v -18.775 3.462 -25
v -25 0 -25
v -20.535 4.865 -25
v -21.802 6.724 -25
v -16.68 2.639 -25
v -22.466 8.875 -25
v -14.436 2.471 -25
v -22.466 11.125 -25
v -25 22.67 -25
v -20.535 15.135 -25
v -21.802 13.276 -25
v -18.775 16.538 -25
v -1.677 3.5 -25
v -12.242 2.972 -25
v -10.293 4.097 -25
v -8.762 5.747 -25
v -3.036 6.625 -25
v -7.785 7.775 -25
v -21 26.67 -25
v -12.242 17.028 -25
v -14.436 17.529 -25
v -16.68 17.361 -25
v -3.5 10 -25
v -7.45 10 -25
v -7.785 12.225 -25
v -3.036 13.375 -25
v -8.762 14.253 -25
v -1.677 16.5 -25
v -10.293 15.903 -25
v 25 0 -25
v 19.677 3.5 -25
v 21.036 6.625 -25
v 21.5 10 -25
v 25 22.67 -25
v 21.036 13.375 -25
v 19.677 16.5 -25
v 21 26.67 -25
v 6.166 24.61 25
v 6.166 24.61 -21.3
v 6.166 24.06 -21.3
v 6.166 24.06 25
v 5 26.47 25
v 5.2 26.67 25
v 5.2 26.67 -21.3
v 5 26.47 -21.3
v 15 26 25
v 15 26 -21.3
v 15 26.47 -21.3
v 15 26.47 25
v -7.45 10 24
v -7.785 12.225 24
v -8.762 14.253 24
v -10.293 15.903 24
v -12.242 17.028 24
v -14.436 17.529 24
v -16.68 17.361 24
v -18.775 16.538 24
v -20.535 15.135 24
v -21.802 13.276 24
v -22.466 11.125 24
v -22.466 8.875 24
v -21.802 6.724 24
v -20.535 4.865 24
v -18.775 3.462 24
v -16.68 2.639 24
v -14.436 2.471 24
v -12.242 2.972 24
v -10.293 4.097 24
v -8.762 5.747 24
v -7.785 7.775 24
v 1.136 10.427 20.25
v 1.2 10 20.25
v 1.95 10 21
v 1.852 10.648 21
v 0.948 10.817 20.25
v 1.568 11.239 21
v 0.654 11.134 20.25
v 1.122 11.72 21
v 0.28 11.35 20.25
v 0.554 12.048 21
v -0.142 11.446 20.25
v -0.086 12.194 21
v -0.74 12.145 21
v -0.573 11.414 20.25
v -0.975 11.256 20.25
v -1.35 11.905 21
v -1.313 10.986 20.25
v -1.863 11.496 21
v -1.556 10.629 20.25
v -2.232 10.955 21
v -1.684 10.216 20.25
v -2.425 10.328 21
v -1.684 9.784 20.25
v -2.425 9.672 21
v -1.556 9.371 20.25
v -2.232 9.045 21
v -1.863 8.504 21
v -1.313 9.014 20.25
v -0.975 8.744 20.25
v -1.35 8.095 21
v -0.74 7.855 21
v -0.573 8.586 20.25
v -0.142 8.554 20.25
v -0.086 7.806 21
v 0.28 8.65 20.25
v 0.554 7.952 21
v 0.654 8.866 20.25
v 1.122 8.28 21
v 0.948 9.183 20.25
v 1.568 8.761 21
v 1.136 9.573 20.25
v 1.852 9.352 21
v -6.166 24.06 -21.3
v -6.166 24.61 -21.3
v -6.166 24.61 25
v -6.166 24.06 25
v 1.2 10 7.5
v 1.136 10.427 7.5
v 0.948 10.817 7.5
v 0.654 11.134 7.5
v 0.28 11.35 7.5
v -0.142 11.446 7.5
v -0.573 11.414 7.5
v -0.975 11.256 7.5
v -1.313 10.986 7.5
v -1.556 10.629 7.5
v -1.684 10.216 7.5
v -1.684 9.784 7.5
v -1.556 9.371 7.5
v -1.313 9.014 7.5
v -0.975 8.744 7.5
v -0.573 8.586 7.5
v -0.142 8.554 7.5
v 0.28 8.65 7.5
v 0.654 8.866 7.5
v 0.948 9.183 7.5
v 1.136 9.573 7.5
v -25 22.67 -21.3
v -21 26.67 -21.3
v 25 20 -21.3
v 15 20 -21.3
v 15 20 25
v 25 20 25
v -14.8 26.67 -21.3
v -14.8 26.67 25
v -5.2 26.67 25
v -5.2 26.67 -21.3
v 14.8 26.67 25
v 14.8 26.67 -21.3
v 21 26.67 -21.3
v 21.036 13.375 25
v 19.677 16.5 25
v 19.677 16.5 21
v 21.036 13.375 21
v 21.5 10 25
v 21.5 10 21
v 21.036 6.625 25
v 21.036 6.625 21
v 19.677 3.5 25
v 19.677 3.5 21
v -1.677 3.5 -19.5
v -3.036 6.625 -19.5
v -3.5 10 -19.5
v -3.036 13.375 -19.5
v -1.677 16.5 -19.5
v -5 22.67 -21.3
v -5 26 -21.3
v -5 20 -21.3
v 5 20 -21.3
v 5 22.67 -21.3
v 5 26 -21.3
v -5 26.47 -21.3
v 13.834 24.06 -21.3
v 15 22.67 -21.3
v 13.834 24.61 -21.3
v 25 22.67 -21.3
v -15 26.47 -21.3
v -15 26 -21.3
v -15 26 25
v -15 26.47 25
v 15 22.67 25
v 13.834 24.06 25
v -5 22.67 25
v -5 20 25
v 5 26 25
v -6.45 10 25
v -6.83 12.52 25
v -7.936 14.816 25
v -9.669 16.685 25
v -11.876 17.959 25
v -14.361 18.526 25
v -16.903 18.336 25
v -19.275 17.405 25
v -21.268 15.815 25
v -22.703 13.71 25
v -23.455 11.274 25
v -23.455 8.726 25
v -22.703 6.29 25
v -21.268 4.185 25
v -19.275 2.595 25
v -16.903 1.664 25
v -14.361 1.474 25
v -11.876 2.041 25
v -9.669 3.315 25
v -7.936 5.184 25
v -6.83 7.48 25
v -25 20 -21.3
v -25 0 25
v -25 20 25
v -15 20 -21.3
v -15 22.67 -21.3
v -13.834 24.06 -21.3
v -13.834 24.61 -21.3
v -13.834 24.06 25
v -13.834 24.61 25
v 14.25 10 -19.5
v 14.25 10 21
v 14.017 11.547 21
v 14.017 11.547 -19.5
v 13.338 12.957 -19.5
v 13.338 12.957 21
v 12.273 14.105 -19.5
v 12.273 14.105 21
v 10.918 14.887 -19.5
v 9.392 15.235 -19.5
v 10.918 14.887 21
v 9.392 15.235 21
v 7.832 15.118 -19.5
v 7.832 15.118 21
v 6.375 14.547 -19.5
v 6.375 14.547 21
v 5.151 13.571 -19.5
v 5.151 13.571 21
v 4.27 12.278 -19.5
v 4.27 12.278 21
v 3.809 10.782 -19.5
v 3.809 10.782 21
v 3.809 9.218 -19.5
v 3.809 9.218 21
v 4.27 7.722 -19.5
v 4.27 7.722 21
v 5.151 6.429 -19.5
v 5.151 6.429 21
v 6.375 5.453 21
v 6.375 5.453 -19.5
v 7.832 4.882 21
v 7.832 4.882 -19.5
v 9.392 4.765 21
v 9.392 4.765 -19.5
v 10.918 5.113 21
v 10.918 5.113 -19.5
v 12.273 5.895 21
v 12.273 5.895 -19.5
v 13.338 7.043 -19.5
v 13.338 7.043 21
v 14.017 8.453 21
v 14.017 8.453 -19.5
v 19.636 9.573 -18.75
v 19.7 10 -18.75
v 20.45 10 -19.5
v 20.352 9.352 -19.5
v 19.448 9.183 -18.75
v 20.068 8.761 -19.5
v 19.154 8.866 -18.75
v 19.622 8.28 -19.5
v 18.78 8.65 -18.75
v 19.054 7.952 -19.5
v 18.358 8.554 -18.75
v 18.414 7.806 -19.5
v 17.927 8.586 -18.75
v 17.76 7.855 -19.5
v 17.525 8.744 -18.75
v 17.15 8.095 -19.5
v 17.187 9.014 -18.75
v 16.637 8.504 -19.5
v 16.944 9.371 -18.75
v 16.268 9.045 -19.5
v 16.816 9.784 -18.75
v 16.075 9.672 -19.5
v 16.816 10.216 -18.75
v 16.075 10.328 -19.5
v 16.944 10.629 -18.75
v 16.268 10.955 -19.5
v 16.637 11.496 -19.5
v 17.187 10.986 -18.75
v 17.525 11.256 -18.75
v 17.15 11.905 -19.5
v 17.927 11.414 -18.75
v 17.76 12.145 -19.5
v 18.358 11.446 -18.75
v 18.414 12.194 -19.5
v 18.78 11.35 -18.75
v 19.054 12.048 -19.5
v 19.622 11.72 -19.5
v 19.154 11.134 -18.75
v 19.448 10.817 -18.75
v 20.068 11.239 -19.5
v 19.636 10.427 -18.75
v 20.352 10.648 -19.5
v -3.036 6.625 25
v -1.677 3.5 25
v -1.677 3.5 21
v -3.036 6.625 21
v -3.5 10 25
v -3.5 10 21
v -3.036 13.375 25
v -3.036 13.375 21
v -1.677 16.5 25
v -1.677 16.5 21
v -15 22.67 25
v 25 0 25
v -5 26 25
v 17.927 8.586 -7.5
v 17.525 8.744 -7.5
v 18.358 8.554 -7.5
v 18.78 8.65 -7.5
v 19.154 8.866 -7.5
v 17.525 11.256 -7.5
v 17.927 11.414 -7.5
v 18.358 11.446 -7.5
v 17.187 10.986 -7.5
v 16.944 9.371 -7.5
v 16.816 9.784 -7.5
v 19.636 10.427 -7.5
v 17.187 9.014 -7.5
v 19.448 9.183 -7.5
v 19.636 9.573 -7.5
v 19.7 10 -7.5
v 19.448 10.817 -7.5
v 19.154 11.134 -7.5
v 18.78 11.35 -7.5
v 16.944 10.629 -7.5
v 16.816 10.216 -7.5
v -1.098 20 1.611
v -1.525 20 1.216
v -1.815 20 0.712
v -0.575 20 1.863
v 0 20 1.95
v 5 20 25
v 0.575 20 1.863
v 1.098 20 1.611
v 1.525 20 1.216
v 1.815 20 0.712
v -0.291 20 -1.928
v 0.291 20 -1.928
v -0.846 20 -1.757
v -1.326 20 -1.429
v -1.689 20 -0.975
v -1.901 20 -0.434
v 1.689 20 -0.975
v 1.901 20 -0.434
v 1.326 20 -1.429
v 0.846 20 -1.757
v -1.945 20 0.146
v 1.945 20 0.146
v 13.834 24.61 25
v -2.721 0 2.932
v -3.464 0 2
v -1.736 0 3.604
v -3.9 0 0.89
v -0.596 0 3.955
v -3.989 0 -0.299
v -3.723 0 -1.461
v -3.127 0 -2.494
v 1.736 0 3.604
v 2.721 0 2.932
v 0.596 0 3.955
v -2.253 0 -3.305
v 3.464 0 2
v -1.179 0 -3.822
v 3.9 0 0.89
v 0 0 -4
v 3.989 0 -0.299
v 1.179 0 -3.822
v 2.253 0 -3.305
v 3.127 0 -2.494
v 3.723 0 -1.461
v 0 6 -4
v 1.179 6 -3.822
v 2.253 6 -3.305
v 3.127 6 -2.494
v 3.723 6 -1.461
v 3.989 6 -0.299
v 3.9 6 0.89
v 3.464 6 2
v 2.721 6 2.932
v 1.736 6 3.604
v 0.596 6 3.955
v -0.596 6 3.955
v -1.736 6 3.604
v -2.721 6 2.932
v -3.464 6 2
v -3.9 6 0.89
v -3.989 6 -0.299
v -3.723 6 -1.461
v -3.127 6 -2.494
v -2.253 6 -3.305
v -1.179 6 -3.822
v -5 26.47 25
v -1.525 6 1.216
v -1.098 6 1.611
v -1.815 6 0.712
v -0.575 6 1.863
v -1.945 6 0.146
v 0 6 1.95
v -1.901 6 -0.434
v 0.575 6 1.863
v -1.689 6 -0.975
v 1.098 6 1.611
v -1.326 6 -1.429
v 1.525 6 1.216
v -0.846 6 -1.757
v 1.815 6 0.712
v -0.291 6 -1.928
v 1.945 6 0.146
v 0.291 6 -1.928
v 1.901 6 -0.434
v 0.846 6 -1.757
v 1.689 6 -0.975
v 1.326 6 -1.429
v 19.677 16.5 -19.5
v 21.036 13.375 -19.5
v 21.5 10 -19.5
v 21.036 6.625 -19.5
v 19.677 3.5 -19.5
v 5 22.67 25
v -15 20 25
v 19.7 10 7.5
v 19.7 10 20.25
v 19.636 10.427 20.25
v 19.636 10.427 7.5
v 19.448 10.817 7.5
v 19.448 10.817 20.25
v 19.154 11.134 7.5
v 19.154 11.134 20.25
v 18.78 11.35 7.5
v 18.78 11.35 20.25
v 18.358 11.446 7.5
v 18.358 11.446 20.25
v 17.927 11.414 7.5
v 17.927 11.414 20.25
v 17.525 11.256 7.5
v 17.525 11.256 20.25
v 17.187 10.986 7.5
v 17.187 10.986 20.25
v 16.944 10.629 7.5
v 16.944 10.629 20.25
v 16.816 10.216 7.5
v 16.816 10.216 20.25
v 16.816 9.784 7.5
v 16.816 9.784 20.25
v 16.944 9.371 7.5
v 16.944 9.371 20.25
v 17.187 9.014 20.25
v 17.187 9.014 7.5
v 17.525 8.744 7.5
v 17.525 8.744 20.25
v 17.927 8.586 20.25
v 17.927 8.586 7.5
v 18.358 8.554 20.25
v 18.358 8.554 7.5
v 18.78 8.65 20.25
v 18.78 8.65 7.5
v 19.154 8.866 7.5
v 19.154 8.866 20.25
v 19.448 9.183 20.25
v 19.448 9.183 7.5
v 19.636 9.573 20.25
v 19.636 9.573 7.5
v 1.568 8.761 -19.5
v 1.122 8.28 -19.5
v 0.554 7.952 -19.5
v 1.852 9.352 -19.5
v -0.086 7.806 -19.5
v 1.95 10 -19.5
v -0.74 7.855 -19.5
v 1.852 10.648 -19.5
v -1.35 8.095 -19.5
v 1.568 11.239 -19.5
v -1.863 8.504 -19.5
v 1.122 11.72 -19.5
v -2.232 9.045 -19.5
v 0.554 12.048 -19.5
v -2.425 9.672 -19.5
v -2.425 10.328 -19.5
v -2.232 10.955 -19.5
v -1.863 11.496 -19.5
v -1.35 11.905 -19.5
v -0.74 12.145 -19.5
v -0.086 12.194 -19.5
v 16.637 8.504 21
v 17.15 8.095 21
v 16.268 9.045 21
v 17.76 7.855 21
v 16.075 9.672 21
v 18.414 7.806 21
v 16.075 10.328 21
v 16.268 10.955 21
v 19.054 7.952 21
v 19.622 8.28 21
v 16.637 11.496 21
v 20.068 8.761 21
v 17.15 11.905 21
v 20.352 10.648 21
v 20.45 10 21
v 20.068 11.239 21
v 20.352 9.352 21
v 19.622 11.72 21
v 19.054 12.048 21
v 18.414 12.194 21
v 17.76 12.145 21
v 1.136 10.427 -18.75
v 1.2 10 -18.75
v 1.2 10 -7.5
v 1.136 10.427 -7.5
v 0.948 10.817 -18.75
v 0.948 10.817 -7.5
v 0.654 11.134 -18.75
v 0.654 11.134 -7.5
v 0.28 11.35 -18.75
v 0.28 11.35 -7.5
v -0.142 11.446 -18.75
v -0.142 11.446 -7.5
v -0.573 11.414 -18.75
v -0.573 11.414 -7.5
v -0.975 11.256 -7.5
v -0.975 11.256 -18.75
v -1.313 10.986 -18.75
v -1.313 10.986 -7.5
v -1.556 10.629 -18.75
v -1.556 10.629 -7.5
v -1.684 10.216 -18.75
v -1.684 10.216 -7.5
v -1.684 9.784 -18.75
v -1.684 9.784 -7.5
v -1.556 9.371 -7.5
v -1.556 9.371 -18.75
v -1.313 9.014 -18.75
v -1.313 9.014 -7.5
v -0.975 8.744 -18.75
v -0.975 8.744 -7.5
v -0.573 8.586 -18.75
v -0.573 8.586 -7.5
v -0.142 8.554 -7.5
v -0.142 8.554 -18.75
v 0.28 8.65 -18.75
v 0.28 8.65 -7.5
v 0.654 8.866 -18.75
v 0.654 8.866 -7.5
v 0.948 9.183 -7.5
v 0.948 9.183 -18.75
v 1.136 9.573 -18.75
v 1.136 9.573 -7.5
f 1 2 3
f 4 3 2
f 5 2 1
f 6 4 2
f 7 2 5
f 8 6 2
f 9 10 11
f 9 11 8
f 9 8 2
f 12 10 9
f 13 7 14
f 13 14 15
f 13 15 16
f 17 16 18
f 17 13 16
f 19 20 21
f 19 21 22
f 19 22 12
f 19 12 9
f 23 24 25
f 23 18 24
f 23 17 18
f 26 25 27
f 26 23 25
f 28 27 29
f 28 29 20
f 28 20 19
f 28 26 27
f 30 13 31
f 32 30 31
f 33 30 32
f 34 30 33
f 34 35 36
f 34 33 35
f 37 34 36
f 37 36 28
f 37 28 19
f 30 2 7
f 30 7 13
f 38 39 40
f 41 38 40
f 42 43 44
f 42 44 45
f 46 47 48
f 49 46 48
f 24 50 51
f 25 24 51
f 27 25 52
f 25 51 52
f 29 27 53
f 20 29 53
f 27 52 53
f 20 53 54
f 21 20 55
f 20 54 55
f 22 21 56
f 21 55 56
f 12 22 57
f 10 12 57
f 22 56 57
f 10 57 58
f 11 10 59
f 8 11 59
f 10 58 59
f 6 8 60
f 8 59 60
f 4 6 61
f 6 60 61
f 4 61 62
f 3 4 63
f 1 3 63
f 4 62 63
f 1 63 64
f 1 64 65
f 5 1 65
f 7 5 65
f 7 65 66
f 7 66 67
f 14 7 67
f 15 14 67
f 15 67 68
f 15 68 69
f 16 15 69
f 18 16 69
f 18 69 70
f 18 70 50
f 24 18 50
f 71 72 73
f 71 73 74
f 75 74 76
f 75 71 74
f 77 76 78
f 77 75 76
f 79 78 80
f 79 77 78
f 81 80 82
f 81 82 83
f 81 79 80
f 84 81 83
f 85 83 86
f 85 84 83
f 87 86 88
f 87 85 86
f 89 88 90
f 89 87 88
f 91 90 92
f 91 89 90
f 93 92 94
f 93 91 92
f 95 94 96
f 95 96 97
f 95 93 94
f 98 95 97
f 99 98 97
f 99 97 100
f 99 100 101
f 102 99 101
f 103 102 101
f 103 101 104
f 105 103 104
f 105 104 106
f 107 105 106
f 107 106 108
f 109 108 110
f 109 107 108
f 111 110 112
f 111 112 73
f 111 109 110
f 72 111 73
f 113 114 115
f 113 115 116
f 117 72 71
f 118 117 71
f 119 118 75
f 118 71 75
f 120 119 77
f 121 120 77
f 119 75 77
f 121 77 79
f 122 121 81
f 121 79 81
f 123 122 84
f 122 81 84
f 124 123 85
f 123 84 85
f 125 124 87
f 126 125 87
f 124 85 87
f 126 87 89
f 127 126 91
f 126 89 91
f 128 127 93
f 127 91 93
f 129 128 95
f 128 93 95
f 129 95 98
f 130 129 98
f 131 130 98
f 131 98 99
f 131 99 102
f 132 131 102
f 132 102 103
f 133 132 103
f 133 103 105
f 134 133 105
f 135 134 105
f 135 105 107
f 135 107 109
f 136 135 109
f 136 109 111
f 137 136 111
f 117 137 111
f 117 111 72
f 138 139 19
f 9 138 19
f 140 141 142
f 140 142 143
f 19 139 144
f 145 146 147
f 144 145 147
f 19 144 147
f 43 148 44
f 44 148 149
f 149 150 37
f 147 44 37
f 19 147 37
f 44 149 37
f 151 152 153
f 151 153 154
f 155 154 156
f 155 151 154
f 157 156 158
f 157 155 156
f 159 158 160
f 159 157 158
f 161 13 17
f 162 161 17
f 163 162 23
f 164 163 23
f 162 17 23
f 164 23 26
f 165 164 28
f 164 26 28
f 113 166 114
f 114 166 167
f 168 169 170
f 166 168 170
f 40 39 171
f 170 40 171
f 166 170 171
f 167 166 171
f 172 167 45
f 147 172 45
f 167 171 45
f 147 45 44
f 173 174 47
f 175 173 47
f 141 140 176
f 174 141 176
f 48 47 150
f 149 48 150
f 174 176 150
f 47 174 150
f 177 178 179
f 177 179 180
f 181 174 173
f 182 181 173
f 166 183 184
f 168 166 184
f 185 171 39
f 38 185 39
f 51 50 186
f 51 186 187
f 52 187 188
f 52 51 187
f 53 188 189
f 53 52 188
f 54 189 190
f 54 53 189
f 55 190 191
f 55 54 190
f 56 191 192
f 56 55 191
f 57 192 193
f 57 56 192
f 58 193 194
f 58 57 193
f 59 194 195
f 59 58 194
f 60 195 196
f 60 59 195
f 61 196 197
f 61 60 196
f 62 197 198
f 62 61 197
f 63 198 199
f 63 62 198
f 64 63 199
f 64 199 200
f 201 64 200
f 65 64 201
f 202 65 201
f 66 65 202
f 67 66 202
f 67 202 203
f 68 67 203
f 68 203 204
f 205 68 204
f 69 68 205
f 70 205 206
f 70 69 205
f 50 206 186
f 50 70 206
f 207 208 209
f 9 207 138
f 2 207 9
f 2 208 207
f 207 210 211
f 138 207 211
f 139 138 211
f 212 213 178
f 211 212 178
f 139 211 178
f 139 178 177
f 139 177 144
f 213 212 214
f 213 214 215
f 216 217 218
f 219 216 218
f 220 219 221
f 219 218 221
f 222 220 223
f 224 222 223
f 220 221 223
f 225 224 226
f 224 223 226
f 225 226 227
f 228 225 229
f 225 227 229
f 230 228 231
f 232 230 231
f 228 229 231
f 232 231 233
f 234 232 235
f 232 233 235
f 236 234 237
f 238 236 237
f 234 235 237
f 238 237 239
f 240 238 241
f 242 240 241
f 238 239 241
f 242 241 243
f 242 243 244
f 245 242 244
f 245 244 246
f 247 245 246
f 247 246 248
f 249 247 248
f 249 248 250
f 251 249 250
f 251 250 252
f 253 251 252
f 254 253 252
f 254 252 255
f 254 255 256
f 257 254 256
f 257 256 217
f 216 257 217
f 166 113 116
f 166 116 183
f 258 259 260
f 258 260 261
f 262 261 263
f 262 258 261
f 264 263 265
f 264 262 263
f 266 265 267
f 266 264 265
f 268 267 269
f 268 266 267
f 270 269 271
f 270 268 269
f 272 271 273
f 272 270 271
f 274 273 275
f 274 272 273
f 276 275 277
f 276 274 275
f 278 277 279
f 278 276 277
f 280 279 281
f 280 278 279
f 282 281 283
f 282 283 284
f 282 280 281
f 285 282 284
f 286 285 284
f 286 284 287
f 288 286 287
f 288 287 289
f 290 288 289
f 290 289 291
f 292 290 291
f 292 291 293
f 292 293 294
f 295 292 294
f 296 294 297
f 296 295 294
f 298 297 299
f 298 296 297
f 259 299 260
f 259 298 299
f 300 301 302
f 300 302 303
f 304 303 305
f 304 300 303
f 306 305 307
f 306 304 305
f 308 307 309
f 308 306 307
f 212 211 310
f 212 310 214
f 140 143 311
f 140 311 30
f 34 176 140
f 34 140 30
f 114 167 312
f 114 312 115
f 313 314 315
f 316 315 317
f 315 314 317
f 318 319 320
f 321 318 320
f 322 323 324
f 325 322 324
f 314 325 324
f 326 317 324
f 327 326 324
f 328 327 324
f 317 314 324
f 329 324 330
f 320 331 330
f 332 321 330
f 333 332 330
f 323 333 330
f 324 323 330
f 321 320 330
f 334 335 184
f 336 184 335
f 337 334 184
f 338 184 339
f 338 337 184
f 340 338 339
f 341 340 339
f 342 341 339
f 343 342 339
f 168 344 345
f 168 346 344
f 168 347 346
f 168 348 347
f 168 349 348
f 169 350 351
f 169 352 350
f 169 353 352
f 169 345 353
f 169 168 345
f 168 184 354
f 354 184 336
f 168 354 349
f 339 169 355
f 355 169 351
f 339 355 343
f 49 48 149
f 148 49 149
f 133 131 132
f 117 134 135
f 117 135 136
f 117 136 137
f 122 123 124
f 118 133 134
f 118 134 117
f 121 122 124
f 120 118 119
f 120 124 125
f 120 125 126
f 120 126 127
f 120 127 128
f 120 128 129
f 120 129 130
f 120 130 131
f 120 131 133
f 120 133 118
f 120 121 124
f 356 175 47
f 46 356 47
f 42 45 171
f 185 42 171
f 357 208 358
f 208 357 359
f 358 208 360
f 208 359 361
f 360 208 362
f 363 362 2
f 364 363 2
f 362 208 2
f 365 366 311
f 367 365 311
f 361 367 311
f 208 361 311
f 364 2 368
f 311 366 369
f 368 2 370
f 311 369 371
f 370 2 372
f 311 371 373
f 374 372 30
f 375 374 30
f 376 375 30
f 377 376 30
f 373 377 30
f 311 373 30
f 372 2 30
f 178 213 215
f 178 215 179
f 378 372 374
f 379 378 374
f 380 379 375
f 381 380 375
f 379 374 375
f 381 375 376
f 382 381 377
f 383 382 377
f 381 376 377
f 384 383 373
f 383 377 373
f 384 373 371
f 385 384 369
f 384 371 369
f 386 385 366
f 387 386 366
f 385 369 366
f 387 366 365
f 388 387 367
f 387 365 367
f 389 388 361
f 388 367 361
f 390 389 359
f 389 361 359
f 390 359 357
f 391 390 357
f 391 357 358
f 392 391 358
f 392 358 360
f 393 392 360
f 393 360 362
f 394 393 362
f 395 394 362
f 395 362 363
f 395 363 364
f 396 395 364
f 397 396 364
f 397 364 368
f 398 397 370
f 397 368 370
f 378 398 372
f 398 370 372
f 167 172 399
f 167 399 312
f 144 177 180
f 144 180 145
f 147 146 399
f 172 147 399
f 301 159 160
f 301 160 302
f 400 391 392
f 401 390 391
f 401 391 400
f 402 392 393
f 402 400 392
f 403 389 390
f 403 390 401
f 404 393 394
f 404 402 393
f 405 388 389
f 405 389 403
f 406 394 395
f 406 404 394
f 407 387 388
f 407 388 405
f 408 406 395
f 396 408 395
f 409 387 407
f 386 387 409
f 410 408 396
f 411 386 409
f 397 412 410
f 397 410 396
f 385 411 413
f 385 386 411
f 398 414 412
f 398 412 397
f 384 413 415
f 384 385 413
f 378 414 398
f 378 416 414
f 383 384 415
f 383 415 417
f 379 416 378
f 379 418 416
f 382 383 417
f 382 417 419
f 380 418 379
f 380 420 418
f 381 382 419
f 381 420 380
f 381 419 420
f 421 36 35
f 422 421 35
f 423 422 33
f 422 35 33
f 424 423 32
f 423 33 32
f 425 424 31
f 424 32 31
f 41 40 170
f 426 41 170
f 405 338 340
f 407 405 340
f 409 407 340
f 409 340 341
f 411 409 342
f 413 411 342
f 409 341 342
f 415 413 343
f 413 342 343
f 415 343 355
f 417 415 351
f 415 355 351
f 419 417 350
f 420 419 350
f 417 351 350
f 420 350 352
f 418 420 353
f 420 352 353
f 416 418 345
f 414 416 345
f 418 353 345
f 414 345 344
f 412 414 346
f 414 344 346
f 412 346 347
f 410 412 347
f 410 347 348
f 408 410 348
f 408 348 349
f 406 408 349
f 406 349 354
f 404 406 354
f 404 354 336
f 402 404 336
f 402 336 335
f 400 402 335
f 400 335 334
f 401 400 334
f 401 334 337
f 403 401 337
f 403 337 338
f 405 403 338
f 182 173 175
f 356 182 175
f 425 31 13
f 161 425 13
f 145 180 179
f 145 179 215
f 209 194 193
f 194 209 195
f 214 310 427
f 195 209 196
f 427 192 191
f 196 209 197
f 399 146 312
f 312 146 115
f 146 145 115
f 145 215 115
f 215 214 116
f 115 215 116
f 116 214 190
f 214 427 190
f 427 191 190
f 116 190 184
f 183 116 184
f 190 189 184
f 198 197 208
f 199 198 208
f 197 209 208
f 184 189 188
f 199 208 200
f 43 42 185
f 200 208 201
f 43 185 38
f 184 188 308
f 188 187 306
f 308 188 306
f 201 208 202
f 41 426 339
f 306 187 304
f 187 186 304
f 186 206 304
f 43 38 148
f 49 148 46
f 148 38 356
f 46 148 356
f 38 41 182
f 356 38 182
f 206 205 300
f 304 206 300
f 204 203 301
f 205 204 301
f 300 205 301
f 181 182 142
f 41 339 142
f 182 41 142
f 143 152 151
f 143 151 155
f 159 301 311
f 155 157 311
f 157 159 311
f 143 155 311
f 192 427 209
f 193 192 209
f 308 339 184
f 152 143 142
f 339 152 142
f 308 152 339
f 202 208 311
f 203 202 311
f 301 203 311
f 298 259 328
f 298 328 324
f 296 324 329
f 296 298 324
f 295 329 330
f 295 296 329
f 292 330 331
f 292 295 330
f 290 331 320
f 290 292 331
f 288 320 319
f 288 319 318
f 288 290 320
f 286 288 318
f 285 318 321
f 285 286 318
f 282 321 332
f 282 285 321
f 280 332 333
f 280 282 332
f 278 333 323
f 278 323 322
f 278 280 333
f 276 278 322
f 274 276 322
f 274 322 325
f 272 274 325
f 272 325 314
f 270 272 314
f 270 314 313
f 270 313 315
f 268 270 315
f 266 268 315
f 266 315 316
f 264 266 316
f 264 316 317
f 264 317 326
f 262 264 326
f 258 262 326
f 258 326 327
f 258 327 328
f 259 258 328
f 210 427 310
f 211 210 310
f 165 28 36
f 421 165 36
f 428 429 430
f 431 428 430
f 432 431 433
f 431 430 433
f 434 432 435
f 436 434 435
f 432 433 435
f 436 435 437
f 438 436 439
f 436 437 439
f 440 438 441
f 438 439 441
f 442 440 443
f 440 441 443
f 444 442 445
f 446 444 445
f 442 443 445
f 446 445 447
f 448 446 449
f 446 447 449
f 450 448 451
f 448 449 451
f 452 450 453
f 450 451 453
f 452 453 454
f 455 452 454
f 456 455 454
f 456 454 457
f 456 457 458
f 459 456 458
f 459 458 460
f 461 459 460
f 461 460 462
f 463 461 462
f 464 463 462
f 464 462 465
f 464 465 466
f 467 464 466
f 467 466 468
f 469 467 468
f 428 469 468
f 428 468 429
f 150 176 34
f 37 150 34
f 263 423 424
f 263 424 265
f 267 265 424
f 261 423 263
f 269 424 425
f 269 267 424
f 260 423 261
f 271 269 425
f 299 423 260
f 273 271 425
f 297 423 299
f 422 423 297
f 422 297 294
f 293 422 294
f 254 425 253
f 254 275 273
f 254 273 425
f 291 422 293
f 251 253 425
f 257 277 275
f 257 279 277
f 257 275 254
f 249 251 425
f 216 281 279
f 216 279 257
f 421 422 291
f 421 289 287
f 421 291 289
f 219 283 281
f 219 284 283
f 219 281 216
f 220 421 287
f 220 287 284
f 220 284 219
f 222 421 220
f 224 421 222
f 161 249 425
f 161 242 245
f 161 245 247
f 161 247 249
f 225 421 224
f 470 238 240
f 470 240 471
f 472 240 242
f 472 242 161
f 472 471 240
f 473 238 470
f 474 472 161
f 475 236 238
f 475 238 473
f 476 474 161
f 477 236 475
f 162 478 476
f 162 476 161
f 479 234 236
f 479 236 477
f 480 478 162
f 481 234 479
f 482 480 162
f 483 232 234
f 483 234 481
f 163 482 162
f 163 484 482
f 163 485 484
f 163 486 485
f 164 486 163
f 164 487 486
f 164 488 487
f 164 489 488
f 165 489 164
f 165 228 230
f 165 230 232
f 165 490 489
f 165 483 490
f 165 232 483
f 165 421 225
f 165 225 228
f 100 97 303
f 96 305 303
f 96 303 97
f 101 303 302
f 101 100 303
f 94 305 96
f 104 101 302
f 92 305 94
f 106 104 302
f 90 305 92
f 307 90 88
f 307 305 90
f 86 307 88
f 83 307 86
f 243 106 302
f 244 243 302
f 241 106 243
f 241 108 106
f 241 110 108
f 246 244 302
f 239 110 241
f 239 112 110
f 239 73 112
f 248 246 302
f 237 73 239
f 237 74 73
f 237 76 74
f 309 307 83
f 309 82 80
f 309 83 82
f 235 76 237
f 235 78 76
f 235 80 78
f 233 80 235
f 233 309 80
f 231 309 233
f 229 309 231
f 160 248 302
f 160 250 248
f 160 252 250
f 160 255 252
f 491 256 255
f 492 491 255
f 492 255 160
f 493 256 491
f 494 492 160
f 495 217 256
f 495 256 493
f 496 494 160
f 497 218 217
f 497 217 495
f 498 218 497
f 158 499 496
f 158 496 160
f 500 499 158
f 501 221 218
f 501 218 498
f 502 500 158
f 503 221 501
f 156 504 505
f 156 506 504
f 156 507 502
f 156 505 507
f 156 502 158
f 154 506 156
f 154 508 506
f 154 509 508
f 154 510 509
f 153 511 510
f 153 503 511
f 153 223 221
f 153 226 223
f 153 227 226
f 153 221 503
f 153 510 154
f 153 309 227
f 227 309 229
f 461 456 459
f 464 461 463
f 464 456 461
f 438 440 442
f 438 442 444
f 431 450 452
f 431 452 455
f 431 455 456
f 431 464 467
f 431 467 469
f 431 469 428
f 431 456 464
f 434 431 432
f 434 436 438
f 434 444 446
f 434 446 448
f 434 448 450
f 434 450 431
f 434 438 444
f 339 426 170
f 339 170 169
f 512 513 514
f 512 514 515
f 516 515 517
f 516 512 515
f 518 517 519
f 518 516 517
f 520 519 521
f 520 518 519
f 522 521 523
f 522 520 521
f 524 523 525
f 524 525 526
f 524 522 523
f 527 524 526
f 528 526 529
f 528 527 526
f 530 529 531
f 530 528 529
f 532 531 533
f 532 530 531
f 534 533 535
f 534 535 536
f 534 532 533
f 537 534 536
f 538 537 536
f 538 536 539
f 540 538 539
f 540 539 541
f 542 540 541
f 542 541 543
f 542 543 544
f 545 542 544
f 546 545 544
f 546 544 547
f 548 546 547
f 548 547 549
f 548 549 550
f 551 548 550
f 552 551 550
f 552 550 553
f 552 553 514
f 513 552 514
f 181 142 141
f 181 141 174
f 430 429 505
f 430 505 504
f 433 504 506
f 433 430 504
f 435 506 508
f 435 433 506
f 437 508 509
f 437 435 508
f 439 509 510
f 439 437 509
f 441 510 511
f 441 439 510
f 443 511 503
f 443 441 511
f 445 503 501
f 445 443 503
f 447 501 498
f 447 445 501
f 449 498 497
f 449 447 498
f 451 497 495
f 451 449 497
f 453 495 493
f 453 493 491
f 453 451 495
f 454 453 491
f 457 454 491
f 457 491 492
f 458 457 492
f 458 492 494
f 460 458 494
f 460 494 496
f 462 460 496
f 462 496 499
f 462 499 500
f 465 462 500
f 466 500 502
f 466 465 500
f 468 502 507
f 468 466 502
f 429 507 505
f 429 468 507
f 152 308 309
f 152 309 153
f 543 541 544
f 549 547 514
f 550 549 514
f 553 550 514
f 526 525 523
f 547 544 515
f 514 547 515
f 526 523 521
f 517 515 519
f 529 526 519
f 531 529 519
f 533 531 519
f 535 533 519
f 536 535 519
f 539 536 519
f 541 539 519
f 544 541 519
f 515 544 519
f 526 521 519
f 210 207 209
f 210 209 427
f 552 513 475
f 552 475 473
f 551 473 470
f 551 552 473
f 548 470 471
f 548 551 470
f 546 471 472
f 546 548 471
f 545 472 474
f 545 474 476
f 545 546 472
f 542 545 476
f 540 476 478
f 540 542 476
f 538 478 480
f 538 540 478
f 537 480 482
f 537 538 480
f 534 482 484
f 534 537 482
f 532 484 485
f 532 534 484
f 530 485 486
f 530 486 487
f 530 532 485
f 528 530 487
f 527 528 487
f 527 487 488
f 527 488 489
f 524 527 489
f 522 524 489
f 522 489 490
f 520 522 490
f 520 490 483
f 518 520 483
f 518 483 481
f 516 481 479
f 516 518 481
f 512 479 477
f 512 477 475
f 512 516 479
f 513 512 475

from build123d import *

# Parameters (mm, degrees)
SKICA4_W                  = 50
SKICA4_H                  = 50
P_IDAT_VYSUNUT_M2_DEPTH   = 20
ODEBRAT_VYSUNUT_M3_DEPTH  = 3.5
SKICA6_R                  = 1.45
ODEBRAT_VYSUNUT_M4_DEPTH  = 14
SKICA7_R                  = 5.25
ODEBRAT_VYSUNUT_M5_DEPTH  = 57.455734873
SKICA8_R                  = 7.55
ODEBRAT_VYSUNUT_M6_DEPTH  = 60.371710435
P_IDAT_VYSUNUT_M4_DEPTH   = 50
SKICA12_R                 = 1.95
ODEBRAT_VYSUNUT_M7_DEPTH  = 41.620192023
SKICA13_R                 = 4
ODEBRAT_VYSUNUT_M8_DEPTH  = 6
P_IDAT_VYSUNUT_M5_REACH   = 63.938
SKICA14_W                 = 3.7
SKICA14_H                 = 6.67
ZKOSEN_1_SIZE             = 1
ODEBRAT_VYSUNUT_M9_DEPTH  = 2
ODEBRAT_VYSUNUT_M10_DEPTH = 0.5
ZKOSEN_2_SIZE             = 0.75
ZKOSEN_3_SIZE             = 4


with BuildPart() as part:
    # Skica4 → Přidat vysunutím2 (new body)
    with BuildSketch(Plane(origin=(0, 0, 0), x_dir=(1, 0, 0), z_dir=(0, 1, 0))):
        Rectangle(SKICA4_W, SKICA4_H)
    extrude(amount=P_IDAT_VYSUNUT_M2_DEPTH)

    # Skica5 → Odebrat vysunutím3 (cut)
    with BuildSketch(Plane.XY.offset(25)):
        with BuildLine():
            Line((-1.677078252, 16.5), (19.677078252, 16.5))
            ThreePointArc((19.677078252, 16.5), (21.5, 10), (19.677078252, 3.5))
            Line((19.677078252, 3.5), (-1.677078252, 3.5))
            ThreePointArc((-1.677078252, 3.5), (-3.5, 10), (-1.677078252, 16.5))
        make_face()
    odebrat_vysunut_m3 = extrude(amount=-ODEBRAT_VYSUNUT_M3_DEPTH, mode=Mode.SUBTRACT)

    # Skica6 → Odebrat vysunutím4 (cut)
    with BuildSketch(Plane.XY.offset(21.5)):
        with Locations((-0.25, 10)):
            Circle(SKICA6_R)
        with Locations((18.25, 10)):
            Circle(SKICA6_R)
    odebrat_vysunut_m4 = extrude(amount=-ODEBRAT_VYSUNUT_M4_DEPTH, mode=Mode.SUBTRACT)

    # Zrcadlit1: Odebrat vysunutím3, Odebrat vysunutím4 across plane
    add(odebrat_vysunut_m3.mirror(Plane.XY), mode=Mode.SUBTRACT)
    add(odebrat_vysunut_m4.mirror(Plane.XY), mode=Mode.SUBTRACT)

    # Skica7 → Odebrat vysunutím5 (cut, through all)
    with BuildSketch(Plane.XY.offset(21.5)):
        with Locations((9, 10)):
            Circle(SKICA7_R)
    extrude(amount=-ODEBRAT_VYSUNUT_M5_DEPTH, mode=Mode.SUBTRACT)

    # Skica8 → Odebrat vysunutím6 (cut, through all)
    with BuildSketch(Plane.XY.offset(25)):
        with Locations((-15, 10)):
            Circle(SKICA8_R)
    extrude(amount=-ODEBRAT_VYSUNUT_M6_DEPTH, mode=Mode.SUBTRACT)

    # Skica11 → Přidat vysunutím4 (add)
    with BuildSketch(Plane(origin=(0, 0, -25), x_dir=(-1, 0, 0), z_dir=(0, 0, -1))):
        Polygon((-15, 20), (-15, 22.67), (-13.833651513, 24.06), (-13.833651513, 24.61), (-15, 26), (-15, 26.47), (-14.8, 26.67), (-5.2, 26.67), (-5, 26.47), (-5, 26), (-6.166348487, 24.61), (-6.166348487, 24.06), (-5, 22.67), (-5, 20), align=None)
        Polygon((15, 20), (15, 22.67), (13.833651513, 24.06), (13.833651513, 24.61), (15, 26), (15, 26.47), (14.8, 26.67), (5.2, 26.67), (5, 26.47), (5, 26), (6.166348487, 24.61), (6.166348487, 24.06), (5, 22.67), (5, 20), align=None)
    extrude(amount=-P_IDAT_VYSUNUT_M4_DEPTH)

    # Skica12 → Odebrat vysunutím7 (cut, through all)
    with BuildSketch(Plane(origin=(0, 20, 0), x_dir=(1, 0, 0), z_dir=(0, 1, 0))):
        with Locations(Location((0, 0, 0), (0, 0, 270))):
            Circle(SKICA12_R)
    extrude(amount=-ODEBRAT_VYSUNUT_M7_DEPTH, mode=Mode.SUBTRACT)

    # Skica13 → Odebrat vysunutím8 (cut)
    with BuildSketch(Plane.XZ):
        with Locations(Location((0, 0, 0), (0, 0, 270))):
            Circle(SKICA13_R)
    extrude(amount=-ODEBRAT_VYSUNUT_M8_DEPTH, mode=Mode.SUBTRACT)

    # Přidat vysunutím5: up to this face of the body (flat: up to its plane)
    p_idat_vysunut_m5_end = Plane(part.part.faces().sort_by_distance((-25, 10, 0))[0])
    # Skica14 → Přidat vysunutím5 (add, up to the picked face)
    with BuildSketch(Plane(origin=(25, 0, 0), x_dir=(0, 0, -1), z_dir=(1, 0, 0)), mode=Mode.PRIVATE) as p_idat_vysunut_m5_sk1:
        with Locations((23.15, 23.335)):
            Rectangle(SKICA14_W, SKICA14_H)
    p_idat_vysunut_m5_tool1 = split(extrude(p_idat_vysunut_m5_sk1.sketch, amount=-P_IDAT_VYSUNUT_M5_REACH, mode=Mode.PRIVATE), bisect_by=p_idat_vysunut_m5_end, keep=Keep.BOTH, mode=Mode.PRIVATE)
    add(p_idat_vysunut_m5_tool1.solids().sort_by(Axis((25, 23.335, -23.15), (-1, 0, 0)))[0])

    # Zkosení1
    zkosen_1_edges = [part.edges().sort_by_distance(p)[0] for p in [
        (-22.55, 10, 25),
    ]]
    chamfer(zkosen_1_edges, length=ZKOSEN_1_SIZE)

    # Skica16 → Odebrat vysunutím9 (cut)
    with BuildSketch(Plane(origin=(0, 0, -21.5), x_dir=(-1, 0, 0), z_dir=(0, 0, -1))):
        with BuildLine():
            Line((1.677078252, 16.5), (-19.677078252, 16.5))
            ThreePointArc((-19.677078252, 16.5), (-21.5, 10), (-19.677078252, 3.5))
            Line((-19.677078252, 3.5), (1.677078252, 3.5))
            ThreePointArc((1.677078252, 3.5), (3.5, 10), (1.677078252, 16.5))
        make_face()
    extrude(amount=-ODEBRAT_VYSUNUT_M9_DEPTH, mode=Mode.SUBTRACT)

    # Skica17 → Odebrat vysunutím10 (cut)
    with BuildSketch(Plane.XY.offset(21.5)):
        with BuildLine():
            Line((-1.677078252, 3.5), (19.677078252, 3.5))
            ThreePointArc((19.677078252, 3.5), (21.5, 10), (19.677078252, 16.5))
            Line((19.677078252, 16.5), (-1.677078252, 16.5))
            ThreePointArc((-1.677078252, 16.5), (-3.5, 10), (-1.677078252, 3.5))
        make_face()
    extrude(amount=-ODEBRAT_VYSUNUT_M10_DEPTH, mode=Mode.SUBTRACT)

    # Zkosení2
    zkosen_2_edges = [part.edges().sort_by_distance(p)[0] for p in [
        (16.8, 10, -19.5),
        (-1.7, 10, -19.5),
        (16.8, 10, 21),
        (-1.7, 10, 21),
    ]]
    chamfer(zkosen_2_edges, length=ZKOSEN_2_SIZE)

    # Zkosení3
    zkosen_3_edges = [part.edges().sort_by_distance(p)[0] for p in [
        (25, 26.67, -23.15),
        (-25, 26.67, -23.15),
    ]]
    chamfer(zkosen_3_edges, length=ZKOSEN_3_SIZE)


solid = part.part
